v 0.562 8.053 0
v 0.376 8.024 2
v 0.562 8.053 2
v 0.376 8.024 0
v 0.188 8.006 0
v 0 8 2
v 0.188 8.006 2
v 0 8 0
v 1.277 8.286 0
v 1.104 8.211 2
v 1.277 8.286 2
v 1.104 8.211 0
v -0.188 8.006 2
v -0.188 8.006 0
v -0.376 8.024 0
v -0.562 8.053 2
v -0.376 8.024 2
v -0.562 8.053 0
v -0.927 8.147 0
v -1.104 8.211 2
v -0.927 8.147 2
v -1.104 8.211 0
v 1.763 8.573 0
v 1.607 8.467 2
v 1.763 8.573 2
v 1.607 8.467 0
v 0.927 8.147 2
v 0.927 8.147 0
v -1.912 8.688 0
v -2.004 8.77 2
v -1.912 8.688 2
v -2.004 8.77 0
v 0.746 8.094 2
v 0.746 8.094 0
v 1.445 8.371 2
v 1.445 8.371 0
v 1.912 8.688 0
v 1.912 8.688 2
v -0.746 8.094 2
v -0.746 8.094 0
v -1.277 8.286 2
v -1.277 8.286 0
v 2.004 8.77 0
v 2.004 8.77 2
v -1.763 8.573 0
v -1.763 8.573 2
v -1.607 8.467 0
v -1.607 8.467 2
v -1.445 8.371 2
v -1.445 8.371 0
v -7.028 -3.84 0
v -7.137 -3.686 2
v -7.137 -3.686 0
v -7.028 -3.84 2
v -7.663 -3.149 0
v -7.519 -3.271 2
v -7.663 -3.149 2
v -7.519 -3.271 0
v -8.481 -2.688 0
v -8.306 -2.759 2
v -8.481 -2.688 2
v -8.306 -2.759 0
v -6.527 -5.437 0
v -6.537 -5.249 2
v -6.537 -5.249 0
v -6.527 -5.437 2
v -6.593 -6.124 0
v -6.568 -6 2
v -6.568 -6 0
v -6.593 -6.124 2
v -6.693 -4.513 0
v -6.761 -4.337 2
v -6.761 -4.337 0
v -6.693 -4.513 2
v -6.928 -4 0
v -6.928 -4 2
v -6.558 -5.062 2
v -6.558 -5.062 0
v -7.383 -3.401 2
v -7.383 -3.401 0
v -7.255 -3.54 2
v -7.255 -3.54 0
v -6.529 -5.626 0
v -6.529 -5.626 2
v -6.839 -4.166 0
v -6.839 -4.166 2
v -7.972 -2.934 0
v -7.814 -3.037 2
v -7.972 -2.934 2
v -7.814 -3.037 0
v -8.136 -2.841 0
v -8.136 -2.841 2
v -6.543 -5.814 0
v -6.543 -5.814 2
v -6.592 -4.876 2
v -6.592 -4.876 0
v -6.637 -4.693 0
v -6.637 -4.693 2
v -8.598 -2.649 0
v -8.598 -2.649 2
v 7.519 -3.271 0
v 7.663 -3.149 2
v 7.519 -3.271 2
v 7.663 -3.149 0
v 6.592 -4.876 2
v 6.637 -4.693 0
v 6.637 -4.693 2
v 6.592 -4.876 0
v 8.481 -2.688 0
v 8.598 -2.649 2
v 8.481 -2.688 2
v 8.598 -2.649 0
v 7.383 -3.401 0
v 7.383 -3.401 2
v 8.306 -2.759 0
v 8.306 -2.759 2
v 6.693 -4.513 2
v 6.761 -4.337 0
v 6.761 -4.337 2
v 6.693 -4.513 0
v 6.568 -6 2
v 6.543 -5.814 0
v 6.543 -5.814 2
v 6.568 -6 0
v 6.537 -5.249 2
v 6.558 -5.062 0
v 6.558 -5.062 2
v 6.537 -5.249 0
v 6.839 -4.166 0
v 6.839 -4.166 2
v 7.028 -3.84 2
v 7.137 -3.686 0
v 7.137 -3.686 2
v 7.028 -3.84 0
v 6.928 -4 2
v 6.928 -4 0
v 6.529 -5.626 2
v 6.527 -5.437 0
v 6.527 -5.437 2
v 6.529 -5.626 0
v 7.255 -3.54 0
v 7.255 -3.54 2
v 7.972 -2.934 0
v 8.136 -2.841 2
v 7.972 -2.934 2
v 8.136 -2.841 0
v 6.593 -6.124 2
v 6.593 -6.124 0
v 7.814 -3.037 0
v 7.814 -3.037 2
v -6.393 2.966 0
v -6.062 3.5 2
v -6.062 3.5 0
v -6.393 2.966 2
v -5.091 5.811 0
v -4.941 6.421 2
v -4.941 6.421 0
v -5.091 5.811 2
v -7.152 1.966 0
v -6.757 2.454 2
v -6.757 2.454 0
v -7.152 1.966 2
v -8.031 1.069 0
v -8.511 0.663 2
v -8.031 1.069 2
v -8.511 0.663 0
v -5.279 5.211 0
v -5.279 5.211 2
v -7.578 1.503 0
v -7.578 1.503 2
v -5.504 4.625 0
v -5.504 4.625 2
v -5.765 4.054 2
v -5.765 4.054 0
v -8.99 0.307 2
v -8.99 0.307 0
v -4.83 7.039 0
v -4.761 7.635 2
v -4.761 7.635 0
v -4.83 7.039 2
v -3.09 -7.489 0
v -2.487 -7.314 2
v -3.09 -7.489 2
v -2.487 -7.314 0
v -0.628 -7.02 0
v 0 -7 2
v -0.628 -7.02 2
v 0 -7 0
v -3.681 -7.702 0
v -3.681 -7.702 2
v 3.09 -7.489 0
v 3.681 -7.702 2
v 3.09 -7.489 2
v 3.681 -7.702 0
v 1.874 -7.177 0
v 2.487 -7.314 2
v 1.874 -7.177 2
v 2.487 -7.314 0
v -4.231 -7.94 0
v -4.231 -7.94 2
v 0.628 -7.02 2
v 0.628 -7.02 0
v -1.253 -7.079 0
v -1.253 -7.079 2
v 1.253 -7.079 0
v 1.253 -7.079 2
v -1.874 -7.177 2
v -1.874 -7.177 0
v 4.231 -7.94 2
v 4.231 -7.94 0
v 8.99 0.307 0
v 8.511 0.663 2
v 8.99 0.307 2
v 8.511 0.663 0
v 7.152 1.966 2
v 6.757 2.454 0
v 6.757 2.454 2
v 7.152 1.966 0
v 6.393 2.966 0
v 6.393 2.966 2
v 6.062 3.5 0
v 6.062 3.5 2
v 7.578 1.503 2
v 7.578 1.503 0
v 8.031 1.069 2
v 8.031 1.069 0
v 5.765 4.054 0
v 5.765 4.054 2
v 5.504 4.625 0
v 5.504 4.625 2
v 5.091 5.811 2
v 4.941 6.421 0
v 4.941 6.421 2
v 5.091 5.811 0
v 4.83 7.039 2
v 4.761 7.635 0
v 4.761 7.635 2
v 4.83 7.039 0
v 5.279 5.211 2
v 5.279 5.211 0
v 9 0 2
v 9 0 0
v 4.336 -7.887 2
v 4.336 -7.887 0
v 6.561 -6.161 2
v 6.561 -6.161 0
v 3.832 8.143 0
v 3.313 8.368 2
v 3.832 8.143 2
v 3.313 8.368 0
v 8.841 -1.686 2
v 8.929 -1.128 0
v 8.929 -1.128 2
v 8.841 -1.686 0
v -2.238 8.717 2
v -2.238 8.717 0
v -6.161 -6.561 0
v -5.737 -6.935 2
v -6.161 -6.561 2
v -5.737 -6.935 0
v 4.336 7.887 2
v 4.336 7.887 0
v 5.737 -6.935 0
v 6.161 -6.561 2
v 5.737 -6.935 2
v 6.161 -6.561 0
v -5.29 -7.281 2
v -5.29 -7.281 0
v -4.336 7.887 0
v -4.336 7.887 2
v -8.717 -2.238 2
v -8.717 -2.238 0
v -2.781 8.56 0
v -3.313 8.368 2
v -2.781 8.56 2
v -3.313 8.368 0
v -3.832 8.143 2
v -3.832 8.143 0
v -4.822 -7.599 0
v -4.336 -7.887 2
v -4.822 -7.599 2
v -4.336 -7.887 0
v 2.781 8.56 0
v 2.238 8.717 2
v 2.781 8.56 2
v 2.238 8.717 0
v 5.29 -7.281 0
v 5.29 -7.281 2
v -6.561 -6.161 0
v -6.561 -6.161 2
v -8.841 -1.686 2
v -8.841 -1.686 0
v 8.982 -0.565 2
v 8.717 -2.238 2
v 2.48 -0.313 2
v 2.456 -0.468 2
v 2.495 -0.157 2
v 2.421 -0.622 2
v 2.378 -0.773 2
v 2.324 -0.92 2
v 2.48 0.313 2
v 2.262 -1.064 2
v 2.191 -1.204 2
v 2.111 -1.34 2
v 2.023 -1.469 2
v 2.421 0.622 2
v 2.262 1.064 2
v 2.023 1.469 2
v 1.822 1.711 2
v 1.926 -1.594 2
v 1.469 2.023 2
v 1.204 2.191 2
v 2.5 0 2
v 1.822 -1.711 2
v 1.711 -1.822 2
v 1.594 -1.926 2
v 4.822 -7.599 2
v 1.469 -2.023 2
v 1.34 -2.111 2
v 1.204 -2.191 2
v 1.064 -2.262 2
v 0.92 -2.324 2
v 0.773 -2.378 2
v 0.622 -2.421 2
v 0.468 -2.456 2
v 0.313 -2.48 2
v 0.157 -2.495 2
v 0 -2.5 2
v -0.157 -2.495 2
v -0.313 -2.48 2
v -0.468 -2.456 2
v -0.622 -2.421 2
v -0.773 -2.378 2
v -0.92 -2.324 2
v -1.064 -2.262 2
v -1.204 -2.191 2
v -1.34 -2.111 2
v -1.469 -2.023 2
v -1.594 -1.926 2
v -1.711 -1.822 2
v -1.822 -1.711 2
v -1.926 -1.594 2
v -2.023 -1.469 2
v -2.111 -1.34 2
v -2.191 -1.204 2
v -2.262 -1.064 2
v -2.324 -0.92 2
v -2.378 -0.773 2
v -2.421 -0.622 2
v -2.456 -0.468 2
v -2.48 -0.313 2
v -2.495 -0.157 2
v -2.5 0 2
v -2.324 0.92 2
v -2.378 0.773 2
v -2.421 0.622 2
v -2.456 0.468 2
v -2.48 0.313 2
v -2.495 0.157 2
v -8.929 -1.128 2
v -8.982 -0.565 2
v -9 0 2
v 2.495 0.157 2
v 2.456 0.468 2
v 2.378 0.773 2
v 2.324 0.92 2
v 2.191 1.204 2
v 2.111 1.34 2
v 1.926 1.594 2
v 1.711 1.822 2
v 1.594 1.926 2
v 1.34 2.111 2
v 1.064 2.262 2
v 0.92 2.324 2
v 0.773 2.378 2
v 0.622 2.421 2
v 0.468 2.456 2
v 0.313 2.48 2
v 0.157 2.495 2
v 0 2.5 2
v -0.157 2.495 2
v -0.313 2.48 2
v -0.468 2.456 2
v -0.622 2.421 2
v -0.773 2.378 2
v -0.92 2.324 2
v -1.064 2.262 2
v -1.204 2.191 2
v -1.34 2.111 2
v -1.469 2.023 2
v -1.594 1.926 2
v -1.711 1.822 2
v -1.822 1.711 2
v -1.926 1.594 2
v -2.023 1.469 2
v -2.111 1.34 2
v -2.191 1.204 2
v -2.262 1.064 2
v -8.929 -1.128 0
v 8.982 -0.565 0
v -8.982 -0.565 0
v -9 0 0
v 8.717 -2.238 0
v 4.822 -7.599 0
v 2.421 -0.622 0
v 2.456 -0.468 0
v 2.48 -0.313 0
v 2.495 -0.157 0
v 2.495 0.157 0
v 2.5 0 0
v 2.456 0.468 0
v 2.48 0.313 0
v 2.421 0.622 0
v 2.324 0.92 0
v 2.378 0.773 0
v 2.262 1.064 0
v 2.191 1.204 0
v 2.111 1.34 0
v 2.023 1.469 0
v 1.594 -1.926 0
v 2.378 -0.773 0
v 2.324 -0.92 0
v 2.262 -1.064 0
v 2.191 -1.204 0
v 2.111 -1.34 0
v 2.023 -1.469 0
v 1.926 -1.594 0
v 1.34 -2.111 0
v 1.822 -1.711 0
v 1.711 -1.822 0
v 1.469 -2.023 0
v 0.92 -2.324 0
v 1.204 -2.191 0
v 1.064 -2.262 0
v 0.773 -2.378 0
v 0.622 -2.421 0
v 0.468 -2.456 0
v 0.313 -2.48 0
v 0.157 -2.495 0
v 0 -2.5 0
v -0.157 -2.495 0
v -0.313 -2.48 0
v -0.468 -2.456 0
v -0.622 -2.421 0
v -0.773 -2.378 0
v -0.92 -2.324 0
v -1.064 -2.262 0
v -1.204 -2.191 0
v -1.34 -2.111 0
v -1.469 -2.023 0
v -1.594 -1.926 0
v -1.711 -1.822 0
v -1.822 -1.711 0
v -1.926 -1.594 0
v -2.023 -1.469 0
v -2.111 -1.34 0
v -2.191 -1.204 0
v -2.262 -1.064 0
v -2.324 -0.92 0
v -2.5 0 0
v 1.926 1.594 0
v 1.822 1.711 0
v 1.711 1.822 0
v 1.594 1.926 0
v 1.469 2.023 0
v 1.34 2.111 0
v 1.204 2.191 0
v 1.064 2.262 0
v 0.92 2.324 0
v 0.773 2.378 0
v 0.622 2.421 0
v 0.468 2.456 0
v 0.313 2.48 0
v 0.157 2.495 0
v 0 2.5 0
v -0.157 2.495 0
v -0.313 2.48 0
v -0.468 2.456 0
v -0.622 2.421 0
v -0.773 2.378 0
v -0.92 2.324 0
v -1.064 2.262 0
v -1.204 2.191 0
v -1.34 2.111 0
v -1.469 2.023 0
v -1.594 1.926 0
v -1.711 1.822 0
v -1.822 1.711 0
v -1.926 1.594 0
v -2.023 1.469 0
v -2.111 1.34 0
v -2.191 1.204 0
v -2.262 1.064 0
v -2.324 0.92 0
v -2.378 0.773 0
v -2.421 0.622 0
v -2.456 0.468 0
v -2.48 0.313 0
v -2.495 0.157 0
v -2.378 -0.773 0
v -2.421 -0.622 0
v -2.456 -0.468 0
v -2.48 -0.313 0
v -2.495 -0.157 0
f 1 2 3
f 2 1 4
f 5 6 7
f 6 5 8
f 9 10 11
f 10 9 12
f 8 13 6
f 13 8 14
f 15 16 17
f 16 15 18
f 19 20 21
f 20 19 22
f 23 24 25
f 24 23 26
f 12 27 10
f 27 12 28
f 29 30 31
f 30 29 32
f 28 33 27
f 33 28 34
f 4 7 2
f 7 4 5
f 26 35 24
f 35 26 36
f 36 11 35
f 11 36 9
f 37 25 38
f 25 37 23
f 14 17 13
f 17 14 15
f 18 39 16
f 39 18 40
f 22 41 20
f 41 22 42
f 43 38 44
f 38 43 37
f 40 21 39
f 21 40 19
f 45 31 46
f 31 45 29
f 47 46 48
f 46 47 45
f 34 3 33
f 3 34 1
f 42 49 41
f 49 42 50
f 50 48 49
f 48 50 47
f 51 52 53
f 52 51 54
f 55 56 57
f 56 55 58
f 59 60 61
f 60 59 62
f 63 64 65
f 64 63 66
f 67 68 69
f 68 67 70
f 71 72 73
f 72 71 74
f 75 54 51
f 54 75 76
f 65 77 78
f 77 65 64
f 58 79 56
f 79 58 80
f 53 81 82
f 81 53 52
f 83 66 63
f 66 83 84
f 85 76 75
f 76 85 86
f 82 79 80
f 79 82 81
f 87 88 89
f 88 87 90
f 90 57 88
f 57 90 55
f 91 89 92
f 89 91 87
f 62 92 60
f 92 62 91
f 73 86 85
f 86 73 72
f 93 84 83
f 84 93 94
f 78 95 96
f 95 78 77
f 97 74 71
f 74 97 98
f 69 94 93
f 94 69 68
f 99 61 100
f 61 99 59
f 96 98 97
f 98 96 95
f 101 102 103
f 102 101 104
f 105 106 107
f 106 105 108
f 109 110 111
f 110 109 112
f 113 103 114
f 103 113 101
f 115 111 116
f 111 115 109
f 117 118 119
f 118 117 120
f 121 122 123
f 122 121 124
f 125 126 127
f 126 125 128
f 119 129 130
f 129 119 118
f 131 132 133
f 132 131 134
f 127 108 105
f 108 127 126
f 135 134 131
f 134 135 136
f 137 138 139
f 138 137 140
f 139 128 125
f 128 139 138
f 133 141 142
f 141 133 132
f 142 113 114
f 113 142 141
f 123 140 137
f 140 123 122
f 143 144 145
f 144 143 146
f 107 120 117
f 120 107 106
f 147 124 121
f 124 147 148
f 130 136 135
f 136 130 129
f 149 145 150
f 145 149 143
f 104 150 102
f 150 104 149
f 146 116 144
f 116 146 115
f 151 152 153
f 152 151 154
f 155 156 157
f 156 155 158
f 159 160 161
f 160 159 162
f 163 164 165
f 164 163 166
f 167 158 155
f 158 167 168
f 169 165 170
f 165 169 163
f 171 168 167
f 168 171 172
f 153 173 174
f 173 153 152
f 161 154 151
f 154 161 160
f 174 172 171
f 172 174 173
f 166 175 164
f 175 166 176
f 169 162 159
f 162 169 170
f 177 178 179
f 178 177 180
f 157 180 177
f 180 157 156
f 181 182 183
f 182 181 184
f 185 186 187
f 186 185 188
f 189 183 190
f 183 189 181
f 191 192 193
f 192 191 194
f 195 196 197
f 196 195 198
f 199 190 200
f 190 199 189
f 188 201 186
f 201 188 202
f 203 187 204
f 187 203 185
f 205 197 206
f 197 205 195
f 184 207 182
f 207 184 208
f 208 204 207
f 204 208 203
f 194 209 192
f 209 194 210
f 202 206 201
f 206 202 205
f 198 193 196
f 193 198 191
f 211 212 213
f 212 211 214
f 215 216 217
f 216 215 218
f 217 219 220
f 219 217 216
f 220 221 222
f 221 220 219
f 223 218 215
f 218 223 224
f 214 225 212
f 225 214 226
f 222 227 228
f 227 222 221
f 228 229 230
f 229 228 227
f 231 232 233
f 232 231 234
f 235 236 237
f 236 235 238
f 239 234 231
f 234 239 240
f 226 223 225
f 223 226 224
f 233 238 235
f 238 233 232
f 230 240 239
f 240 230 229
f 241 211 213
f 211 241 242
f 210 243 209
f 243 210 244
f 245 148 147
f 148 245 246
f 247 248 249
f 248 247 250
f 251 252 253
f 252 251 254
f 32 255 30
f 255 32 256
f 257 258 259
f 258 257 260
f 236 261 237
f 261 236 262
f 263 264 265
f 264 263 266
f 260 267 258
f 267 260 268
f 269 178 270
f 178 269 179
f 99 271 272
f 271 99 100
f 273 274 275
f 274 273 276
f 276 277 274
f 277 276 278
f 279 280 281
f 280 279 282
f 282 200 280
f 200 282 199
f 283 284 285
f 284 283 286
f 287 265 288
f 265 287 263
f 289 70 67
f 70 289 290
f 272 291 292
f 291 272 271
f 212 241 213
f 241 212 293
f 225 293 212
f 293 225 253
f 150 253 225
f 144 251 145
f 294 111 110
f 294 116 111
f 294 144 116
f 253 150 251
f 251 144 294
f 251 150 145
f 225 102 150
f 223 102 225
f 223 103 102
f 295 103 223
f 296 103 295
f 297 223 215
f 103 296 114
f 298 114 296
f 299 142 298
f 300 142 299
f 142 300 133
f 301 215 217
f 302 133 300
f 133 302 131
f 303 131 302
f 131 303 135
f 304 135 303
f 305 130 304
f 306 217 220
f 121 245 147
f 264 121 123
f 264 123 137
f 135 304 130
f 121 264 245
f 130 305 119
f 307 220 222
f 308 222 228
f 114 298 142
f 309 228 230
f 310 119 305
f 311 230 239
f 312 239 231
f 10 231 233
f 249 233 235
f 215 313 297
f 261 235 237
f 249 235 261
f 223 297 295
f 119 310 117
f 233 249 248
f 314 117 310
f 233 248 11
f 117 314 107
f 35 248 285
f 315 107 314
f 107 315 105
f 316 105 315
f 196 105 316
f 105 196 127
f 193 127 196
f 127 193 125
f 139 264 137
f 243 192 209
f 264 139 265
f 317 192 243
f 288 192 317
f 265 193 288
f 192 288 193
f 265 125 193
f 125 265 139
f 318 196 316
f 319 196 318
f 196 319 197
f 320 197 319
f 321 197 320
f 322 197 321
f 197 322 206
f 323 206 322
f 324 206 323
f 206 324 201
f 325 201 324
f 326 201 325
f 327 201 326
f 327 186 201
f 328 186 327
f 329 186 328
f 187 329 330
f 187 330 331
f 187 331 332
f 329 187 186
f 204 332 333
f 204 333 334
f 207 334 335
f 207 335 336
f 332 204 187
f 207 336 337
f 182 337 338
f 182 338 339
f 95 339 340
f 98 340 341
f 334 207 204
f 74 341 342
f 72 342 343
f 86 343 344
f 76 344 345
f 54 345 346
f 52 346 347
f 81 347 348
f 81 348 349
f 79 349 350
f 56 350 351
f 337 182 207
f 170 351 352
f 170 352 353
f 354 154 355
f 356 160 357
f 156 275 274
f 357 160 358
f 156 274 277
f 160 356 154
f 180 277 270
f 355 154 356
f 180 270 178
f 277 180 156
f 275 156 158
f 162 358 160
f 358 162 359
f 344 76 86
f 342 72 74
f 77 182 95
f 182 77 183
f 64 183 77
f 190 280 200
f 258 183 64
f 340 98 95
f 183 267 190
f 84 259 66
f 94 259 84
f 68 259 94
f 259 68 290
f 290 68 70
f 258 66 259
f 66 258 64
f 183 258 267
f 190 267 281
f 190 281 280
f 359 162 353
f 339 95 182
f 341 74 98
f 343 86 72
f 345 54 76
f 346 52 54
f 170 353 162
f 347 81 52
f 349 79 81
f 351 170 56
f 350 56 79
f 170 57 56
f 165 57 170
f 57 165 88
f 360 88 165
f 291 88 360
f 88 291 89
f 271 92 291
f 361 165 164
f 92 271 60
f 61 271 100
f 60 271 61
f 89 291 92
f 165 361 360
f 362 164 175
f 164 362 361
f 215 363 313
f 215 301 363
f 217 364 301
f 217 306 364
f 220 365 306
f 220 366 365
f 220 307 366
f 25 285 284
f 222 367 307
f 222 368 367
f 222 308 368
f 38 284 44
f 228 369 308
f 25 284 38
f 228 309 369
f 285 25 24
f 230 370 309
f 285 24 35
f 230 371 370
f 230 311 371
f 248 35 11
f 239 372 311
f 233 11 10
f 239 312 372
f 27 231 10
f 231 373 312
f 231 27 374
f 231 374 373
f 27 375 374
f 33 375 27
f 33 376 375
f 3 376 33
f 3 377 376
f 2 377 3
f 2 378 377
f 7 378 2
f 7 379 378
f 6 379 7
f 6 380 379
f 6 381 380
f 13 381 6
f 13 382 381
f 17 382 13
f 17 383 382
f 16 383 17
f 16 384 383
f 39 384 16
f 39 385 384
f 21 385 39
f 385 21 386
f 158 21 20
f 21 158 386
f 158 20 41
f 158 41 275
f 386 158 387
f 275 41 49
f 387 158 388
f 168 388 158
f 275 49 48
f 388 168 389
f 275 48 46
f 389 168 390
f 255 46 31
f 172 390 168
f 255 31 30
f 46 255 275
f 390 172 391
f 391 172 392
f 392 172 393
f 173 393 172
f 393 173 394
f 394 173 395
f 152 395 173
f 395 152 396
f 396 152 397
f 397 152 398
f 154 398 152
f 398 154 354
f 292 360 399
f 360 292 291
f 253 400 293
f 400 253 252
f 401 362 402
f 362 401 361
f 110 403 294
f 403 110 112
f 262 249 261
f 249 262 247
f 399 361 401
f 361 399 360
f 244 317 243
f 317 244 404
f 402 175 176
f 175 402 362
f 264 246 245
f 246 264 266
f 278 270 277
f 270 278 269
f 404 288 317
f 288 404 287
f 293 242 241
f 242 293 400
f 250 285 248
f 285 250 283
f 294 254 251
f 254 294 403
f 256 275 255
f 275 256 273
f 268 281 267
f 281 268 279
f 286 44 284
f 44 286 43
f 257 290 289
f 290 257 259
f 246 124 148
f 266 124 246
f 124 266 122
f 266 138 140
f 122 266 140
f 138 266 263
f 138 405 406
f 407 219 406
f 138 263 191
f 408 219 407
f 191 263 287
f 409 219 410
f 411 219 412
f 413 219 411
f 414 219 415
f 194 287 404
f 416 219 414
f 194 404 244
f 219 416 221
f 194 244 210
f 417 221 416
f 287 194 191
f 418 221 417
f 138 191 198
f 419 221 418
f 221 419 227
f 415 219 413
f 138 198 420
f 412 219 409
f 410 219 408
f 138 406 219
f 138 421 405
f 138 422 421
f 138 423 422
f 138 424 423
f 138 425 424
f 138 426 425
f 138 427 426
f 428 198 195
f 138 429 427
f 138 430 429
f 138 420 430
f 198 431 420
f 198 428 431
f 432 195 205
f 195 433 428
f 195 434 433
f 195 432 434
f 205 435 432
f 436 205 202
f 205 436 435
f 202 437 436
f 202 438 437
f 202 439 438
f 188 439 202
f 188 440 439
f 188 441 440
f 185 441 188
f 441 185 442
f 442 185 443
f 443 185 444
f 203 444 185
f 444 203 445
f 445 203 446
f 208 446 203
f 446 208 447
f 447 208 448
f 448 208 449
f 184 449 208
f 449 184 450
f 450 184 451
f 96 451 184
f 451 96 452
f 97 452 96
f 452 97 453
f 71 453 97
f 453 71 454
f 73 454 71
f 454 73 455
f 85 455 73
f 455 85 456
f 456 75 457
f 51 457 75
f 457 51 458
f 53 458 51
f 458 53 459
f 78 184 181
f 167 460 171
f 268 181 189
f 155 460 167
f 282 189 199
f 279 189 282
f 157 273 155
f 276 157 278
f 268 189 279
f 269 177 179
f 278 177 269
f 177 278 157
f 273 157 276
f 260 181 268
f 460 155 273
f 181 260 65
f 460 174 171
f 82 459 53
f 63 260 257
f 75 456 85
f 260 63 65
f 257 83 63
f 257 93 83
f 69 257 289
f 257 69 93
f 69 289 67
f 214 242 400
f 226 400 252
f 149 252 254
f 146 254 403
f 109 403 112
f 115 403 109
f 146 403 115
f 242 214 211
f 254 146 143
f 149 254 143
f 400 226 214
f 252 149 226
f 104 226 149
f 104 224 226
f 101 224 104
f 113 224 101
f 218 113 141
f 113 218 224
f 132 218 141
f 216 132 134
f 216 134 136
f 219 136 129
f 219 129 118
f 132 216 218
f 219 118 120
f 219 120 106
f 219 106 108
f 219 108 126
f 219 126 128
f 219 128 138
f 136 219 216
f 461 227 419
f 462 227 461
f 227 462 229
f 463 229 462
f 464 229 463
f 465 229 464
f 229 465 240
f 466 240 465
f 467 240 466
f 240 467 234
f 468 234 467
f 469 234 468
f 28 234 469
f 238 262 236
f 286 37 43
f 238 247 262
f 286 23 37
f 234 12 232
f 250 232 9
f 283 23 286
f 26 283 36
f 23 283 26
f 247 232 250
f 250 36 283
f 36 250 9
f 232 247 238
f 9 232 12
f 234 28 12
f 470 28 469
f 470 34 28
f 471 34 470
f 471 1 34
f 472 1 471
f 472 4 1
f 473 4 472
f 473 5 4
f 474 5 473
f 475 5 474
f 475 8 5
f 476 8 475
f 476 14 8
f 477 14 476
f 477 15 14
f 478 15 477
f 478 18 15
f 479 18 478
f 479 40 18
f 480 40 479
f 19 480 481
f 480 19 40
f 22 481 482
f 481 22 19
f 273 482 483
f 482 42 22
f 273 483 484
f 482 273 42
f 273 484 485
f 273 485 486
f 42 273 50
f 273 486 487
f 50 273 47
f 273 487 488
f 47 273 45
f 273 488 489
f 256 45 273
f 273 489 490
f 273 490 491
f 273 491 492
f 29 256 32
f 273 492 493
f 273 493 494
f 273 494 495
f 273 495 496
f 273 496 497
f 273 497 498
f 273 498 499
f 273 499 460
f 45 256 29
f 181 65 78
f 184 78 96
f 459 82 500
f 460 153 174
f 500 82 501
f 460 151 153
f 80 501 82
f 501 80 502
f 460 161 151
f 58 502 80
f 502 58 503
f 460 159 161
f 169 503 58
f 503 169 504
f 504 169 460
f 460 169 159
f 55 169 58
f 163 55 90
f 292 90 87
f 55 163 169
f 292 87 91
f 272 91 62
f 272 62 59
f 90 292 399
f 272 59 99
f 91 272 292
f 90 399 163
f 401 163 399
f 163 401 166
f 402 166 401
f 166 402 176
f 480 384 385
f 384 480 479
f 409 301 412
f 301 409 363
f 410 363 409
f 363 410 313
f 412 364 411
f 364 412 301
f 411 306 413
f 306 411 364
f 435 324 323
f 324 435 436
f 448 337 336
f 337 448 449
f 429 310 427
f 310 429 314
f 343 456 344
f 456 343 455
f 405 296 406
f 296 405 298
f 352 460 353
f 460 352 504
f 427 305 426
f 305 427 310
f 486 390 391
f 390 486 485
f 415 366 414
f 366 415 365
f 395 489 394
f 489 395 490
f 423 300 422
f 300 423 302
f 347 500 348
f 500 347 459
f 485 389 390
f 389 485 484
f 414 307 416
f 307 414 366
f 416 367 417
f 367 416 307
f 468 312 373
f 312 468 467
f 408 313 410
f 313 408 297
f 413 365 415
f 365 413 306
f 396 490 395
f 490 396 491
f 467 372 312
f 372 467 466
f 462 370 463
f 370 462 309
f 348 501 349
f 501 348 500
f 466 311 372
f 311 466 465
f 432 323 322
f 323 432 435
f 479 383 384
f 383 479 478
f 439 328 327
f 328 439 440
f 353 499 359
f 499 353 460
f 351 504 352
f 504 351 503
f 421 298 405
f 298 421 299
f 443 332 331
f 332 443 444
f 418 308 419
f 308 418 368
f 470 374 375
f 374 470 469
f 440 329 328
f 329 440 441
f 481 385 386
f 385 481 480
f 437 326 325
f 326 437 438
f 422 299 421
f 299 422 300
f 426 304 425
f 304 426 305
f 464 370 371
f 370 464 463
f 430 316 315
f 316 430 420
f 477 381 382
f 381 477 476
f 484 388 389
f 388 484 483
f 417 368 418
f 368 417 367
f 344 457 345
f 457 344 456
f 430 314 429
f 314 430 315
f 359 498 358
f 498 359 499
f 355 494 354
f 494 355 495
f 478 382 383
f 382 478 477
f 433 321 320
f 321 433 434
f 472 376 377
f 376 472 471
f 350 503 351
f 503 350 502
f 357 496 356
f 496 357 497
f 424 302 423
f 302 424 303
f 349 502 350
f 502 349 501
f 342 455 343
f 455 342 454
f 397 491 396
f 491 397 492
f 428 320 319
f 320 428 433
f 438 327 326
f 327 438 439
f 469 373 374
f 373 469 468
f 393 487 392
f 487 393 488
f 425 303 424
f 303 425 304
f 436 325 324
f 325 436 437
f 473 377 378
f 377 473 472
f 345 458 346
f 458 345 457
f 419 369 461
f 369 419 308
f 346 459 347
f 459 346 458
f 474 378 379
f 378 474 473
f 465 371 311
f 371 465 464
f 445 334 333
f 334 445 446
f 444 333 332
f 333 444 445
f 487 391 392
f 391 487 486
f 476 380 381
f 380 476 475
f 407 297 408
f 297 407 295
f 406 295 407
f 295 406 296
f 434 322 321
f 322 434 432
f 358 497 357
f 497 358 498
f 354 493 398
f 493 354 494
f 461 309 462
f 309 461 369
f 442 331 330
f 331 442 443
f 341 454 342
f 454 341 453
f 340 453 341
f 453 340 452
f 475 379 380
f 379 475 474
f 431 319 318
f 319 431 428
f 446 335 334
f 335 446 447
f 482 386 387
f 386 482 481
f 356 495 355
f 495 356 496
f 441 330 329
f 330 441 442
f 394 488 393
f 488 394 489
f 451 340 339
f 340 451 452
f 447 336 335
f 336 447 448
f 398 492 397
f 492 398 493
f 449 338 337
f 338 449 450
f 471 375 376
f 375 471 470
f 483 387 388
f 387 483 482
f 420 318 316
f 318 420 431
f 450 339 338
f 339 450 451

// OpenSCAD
$fn=100;

h=2;
do=18;
di=5;

corners();

module corners(){

	difference(){
	
		//Main Body 
		union(){

			cylinder(h=h,d=do); 

		}
	
        // Hole
        translate([0,0,-.1])
        cylinder(h=h+1,d=di); 
        
		// Small Grooves 
		for ( i = [0 : 3] ){	
		    rotate( i * 360 / 3, [0, 0, 1])
		  	  translate([0, 11, -.1])
		  		 cylinder(h=h+1,d=6);
		}
			
		//Large Grooves 
        rotate([0,0,360/6]){
            for ( i = [0 : 3] ){	
                rotate( i * 360 / 3, [0, 0, 1])
                  translate([0,  17, -.1])
                    cylinder(h=h+1,d=20);
            }
        }
	}
}

			
